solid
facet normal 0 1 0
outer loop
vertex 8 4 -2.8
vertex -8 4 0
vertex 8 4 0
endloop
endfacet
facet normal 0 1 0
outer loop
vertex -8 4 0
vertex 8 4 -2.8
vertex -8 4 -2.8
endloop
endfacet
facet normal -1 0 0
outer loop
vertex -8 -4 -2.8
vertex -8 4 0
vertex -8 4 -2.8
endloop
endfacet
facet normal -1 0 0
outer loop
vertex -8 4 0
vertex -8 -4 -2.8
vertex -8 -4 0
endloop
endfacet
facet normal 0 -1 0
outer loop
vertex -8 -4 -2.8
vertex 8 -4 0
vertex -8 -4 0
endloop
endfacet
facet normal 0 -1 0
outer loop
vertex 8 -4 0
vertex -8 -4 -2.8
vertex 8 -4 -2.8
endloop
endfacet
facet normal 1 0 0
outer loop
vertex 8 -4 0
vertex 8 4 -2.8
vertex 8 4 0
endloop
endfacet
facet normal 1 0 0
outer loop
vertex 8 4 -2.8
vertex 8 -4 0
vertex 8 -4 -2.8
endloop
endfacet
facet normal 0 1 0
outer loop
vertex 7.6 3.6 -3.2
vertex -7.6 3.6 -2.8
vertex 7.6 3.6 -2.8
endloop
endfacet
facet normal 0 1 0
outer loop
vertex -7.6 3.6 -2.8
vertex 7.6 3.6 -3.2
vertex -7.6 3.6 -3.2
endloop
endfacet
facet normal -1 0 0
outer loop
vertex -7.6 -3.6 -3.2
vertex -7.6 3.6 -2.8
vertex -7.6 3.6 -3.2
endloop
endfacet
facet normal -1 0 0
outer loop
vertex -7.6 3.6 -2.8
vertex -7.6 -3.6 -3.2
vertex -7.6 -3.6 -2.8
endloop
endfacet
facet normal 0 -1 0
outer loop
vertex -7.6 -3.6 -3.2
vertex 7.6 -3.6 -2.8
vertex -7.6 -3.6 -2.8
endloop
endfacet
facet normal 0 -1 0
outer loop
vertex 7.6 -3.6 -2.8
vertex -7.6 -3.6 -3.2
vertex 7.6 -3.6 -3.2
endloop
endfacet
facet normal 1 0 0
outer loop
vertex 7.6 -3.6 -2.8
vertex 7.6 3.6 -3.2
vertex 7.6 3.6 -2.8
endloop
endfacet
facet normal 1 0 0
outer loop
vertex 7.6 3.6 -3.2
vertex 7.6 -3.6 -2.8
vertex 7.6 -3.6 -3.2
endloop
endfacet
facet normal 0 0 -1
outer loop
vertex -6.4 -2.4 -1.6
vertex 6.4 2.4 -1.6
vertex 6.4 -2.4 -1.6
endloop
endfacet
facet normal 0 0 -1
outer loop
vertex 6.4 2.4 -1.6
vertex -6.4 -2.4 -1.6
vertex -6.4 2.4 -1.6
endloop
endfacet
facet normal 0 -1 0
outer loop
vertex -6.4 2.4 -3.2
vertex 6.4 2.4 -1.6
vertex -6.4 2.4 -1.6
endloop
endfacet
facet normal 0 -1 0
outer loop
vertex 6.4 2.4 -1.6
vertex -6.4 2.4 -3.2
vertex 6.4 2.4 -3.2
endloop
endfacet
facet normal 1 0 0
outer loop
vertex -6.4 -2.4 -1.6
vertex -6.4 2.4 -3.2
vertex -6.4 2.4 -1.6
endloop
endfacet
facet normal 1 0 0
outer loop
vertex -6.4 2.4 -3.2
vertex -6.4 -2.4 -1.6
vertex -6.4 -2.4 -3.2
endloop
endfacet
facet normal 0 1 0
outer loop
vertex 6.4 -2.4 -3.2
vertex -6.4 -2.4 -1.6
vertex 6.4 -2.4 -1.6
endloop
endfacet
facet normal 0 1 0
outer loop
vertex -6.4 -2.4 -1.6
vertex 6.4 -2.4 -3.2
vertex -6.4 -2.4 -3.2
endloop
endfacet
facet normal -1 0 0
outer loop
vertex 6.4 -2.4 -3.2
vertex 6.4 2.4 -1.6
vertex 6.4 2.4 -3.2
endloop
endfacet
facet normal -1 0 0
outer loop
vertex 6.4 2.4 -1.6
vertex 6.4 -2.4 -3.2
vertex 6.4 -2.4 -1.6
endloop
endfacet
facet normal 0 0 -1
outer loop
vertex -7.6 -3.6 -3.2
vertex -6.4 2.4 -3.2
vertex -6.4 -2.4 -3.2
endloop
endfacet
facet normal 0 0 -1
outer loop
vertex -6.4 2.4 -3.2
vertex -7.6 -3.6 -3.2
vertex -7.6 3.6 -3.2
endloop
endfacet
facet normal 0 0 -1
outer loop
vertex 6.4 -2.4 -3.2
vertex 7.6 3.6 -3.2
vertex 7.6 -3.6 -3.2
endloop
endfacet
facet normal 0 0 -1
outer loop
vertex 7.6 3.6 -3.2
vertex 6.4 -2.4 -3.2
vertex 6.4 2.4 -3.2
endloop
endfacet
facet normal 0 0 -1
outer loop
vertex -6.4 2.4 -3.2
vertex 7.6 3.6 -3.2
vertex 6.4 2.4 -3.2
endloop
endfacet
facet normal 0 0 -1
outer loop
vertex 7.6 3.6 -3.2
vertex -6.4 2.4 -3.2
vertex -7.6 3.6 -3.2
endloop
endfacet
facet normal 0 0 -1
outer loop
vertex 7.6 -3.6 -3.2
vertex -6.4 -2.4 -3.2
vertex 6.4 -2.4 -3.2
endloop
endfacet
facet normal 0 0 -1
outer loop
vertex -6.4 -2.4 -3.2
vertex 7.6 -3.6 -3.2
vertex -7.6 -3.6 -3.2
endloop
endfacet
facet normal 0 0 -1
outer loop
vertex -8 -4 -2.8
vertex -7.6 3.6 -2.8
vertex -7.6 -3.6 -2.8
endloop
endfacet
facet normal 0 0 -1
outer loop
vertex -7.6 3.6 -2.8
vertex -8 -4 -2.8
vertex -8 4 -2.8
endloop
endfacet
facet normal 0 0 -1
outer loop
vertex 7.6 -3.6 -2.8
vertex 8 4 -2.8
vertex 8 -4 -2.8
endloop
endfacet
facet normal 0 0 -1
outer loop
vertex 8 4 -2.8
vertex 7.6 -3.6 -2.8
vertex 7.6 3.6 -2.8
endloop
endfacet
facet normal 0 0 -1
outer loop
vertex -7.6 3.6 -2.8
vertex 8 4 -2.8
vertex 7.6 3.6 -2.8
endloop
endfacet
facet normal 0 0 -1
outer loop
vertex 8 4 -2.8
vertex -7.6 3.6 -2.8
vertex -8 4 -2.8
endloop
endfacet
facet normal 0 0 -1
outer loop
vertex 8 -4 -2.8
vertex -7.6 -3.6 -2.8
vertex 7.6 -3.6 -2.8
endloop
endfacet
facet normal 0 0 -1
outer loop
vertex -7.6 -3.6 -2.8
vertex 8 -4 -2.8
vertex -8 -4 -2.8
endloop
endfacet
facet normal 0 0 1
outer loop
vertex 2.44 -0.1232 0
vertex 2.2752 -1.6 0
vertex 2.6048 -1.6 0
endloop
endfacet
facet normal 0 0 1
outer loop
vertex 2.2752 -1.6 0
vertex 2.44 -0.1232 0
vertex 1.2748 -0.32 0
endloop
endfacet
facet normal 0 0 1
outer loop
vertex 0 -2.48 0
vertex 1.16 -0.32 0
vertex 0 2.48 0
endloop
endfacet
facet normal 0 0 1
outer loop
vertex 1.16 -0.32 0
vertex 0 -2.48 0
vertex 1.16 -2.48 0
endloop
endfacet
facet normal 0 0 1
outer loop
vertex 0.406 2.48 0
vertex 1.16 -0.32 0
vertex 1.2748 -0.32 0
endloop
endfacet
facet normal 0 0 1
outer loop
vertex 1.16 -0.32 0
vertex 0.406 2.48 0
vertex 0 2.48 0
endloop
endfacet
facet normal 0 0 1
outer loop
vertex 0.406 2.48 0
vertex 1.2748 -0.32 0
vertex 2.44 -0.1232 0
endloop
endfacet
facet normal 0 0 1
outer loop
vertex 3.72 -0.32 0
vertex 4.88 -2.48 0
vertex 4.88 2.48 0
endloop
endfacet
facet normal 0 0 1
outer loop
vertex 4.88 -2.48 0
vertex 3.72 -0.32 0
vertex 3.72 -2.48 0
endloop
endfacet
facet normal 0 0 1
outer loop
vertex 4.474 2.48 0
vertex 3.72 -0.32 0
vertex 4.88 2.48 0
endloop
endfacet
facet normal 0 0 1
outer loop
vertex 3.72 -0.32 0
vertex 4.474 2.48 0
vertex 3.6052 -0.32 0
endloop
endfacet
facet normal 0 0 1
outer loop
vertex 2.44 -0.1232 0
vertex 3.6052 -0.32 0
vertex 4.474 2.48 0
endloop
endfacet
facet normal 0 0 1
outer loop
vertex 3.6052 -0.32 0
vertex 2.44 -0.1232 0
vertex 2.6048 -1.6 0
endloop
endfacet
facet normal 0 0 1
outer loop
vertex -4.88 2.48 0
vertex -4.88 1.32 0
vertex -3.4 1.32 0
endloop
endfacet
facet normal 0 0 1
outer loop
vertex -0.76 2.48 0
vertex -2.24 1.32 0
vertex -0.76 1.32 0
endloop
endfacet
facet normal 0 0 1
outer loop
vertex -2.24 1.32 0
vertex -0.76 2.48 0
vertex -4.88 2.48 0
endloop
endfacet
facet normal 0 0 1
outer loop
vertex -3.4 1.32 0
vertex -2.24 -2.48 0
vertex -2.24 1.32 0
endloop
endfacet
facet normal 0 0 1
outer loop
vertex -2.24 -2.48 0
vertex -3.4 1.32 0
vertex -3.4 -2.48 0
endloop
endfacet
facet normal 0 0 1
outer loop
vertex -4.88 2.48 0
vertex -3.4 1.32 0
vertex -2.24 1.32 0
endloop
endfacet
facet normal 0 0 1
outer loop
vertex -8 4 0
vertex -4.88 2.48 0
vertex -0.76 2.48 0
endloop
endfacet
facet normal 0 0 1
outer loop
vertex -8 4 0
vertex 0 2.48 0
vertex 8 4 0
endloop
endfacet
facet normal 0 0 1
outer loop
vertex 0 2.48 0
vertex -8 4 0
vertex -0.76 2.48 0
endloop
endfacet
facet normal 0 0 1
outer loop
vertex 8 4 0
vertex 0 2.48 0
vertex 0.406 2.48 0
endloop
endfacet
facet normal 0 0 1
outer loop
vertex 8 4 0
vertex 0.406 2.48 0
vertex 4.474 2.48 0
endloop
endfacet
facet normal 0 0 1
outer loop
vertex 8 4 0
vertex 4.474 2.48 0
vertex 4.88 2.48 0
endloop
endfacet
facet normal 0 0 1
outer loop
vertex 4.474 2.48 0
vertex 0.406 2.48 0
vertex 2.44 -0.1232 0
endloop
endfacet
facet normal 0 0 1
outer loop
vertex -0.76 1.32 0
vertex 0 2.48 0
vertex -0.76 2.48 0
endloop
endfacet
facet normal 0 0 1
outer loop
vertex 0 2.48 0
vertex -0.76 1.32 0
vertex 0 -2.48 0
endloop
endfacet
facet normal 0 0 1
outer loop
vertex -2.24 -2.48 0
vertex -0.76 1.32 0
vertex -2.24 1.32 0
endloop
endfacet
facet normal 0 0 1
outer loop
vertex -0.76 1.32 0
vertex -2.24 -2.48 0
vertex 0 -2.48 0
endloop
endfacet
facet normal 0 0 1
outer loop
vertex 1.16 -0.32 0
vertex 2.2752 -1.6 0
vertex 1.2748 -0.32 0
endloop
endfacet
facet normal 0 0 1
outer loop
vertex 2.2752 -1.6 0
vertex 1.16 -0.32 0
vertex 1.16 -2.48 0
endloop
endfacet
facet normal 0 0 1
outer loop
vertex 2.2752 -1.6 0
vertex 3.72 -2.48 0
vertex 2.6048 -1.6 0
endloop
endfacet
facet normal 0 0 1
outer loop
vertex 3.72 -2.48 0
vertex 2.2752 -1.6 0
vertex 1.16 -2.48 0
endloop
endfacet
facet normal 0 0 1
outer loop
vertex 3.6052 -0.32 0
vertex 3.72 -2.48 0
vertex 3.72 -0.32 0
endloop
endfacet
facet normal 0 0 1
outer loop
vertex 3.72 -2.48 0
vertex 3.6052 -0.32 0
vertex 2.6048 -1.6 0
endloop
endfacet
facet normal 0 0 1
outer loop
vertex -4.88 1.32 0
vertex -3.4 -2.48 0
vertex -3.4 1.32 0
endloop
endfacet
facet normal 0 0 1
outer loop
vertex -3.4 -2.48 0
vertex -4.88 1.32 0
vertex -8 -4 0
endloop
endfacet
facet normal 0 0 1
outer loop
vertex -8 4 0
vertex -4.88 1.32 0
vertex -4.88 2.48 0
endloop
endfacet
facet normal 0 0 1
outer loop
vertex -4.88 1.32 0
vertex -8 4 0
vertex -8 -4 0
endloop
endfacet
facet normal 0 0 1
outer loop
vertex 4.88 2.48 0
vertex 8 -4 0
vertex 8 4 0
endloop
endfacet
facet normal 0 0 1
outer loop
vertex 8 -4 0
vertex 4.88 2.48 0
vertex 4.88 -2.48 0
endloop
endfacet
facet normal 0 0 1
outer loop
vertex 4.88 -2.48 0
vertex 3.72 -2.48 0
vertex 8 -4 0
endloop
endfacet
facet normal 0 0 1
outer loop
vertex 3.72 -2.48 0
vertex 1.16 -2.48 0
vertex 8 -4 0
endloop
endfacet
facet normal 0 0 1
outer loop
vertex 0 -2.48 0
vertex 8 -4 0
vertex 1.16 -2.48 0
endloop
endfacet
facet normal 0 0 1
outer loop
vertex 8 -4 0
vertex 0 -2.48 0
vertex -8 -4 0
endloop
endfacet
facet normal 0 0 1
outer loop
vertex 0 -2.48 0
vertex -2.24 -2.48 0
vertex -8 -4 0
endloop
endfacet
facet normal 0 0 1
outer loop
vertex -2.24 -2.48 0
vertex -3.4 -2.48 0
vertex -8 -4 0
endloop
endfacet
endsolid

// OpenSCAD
// file: ../p/box5.scad
use <../lib.scad>
function ldraw_lib__box5() = [
// 0 Box with 5 Faces and All Edges
// 0 Name: box5.dat
// 0 Author: James Jessiman
// 0 !LDRAW_ORG Primitive UPDATE 2012-01
// 0 !LICENSE Licensed under CC BY 4.0 : see CAreadme.txt
// 
// 0 BFC CERTIFY CCW
  [0,"BFC","CERTIFY"],
  [0,"BFC","CCW"],
// 
// 0 !HISTORY 2002-04-03 [sbliss] Modified for BFC compliance
// 0 !HISTORY 2002-04-25 [PTadmin] Official Update 2002-02
// 0 !HISTORY 2007-06-24 [PTadmin] Header formatted for Contributor Agreement
// 0 !HISTORY 2008-07-01 [PTadmin] Official Update 2008-01
// 0 !HISTORY 2012-02-16 [Philo] Changed to CCW
// 0 !HISTORY 2012-03-30 [PTadmin] Official Update 2012-01
// 
// 
// 2 24 1 1 1 -1 1 1
  [2,24,1,1,1,-1,1,1],
// 2 24 -1 1 1 -1 1 -1
  [2,24,-1,1,1,-1,1,-1],
// 2 24 -1 1 -1 1 1 -1
  [2,24,-1,1,-1,1,1,-1],
// 2 24 1 1 -1 1 1 1
  [2,24,1,1,-1,1,1,1],
// 2 24 1 0 1 -1 0 1
  [2,24,1,0,1,-1,0,1],
// 2 24 -1 0 1 -1 0 -1
  [2,24,-1,0,1,-1,0,-1],
// 2 24 -1 0 -1 1 0 -1
  [2,24,-1,0,-1,1,0,-1],
// 2 24 1 0 -1 1 0 1
  [2,24,1,0,-1,1,0,1],
// 2 24 1 0 1 1 1 1
  [2,24,1,0,1,1,1,1],
// 2 24 -1 0 1 -1 1 1
  [2,24,-1,0,1,-1,1,1],
// 2 24 1 0 -1 1 1 -1
  [2,24,1,0,-1,1,1,-1],
// 2 24 -1 0 -1 -1 1 -1
  [2,24,-1,0,-1,-1,1,-1],
// 4 16 -1 1 1 1 1 1 1 1 -1 -1 1 -1
  [4,16,-1,1,1,1,1,1,1,1,-1,-1,1,-1],
// 4 16 -1 1 1 -1 0 1 1 0 1 1 1 1
  [4,16,-1,1,1,-1,0,1,1,0,1,1,1,1],
// 4 16 -1 1 -1 -1 0 -1 -1 0 1 -1 1 1
  [4,16,-1,1,-1,-1,0,-1,-1,0,1,-1,1,1],
// 4 16 1 1 -1 1 0 -1 -1 0 -1 -1 1 -1
  [4,16,1,1,-1,1,0,-1,-1,0,-1,-1,1,-1],
// 4 16 1 1 1 1 0 1 1 0 -1 1 1 -1
  [4,16,1,1,1,1,0,1,1,0,-1,1,1,-1],
];
module ldraw_lib__box5(step=0, col=false, unit=2/5, alt=false, line=0.2, solid=!$preview)
    makepoly(ldraw_lib__box5(), step=step, col=col, unit=unit, alt=alt, line=line, solid=solid);
ldraw_lib__box5(line=0.2);
// file: ../p/box4.scad
use <../lib.scad>
function ldraw_lib__box4() = [
// 0 Box with 4 Faces (2 Parallel Pairs) and All Edges
// 0 Name: box4.dat
// 0 Author: James Jessiman
// 0 !LDRAW_ORG Primitive UPDATE 2012-01
// 0 !LICENSE Licensed under CC BY 4.0 : see CAreadme.txt
// 
// 0 BFC CERTIFY CCW
  [0,"BFC","CERTIFY"],
  [0,"BFC","CCW"],
// 
// 0 !HISTORY 2002-04-03 [sbliss] Modified for BFC compliance
// 0 !HISTORY 2002-04-25 [PTadmin] Official Update 2002-02
// 0 !HISTORY 2007-06-24 [PTadmin] Header formatted for Contributor Agreement
// 0 !HISTORY 2008-07-01 [PTadmin] Official Update 2008-01
// 0 !HISTORY 2012-02-16 [Philo] Changed to CCW
// 0 !HISTORY 2012-03-30 [PTadmin] Official Update 2012-01
// 
// 
// 2 24 1 1 1 -1 1 1
  [2,24,1,1,1,-1,1,1],
// 2 24 -1 1 1 -1 1 -1
  [2,24,-1,1,1,-1,1,-1],
// 2 24 -1 1 -1 1 1 -1
  [2,24,-1,1,-1,1,1,-1],
// 2 24 1 1 -1 1 1 1
  [2,24,1,1,-1,1,1,1],
// 2 24 1 0 1 -1 0 1
  [2,24,1,0,1,-1,0,1],
// 2 24 -1 0 1 -1 0 -1
  [2,24,-1,0,1,-1,0,-1],
// 2 24 -1 0 -1 1 0 -1
  [2,24,-1,0,-1,1,0,-1],
// 2 24 1 0 -1 1 0 1
  [2,24,1,0,-1,1,0,1],
// 2 24 1 0 1 1 1 1
  [2,24,1,0,1,1,1,1],
// 2 24 -1 0 1 -1 1 1
  [2,24,-1,0,1,-1,1,1],
// 2 24 1 0 -1 1 1 -1
  [2,24,1,0,-1,1,1,-1],
// 2 24 -1 0 -1 -1 1 -1
  [2,24,-1,0,-1,-1,1,-1],
// 4 16 -1 1 1 -1 0 1 1 0 1 1 1 1
  [4,16,-1,1,1,-1,0,1,1,0,1,1,1,1],
// 4 16 -1 1 -1 -1 0 -1 -1 0 1 -1 1 1
  [4,16,-1,1,-1,-1,0,-1,-1,0,1,-1,1,1],
// 4 16 1 1 -1 1 0 -1 -1 0 -1 -1 1 -1
  [4,16,1,1,-1,1,0,-1,-1,0,-1,-1,1,-1],
// 4 16 1 1 1 1 0 1 1 0 -1 1 1 -1
  [4,16,1,1,1,1,0,1,1,0,-1,1,1,-1],
];
module ldraw_lib__box4(step=0, col=false, unit=2/5, alt=false, line=0.2, solid=!$preview)
    makepoly(ldraw_lib__box4(), step=step, col=col, unit=unit, alt=alt, line=line, solid=solid);
ldraw_lib__box4(line=0.2);
// file: s/3069bs01.scad
use <../../lib.scad>
use <../../p/box4.scad>
use <../../p/box5.scad>
function ldraw_lib__s__3069bs01() = [
// 0 ~Tile  1 x  2 with Groove without Top Face
// 0 Name: s\3069bs01.dat
// 0 Author: Santeri Piippo [arezey]
// 0 !LDRAW_ORG Subpart UPDATE 2010-02
// 0 !LICENSE Licensed under CC BY 4.0 : see CAreadme.txt
// 
// 0 BFC CERTIFY CCW
  [0,"BFC","CERTIFY"],
  [0,"BFC","CCW"],
// 
// 0 !HISTORY 2010-07-05 [PTadmin] Official Update 2010-02
// 
// 
// 1 16 0 0 0 20 0 0 0 7 0 0 0 10 box4.dat
  [1,16,0,0,0,20,0,0,0,7,0,0,0,10, ldraw_lib__box4()],
// 1 16 0 7 0 19 0 0 0 1 0 0 0 9 box4.dat
  [1,16,0,7,0,19,0,0,0,1,0,0,0,9, ldraw_lib__box4()],
// 0 BFC INVERTNEXT
  [0,"BFC","INVERTNEXT"],
// 1 16 0 8 0 16 0 0 0 -4 0 0 0 6 box5.dat
  [1,16,0,8,0,16,0,0,0,-4,0,0,0,6, ldraw_lib__box5()],
// 4 16 -19 8 9 -16 8 6 -16 8 -6 -19 8 -9
  [4,16,-19,8,9,-16,8,6,-16,8,-6,-19,8,-9],
// 4 16 19 8 -9 16 8 -6 16 8 6 19 8 9
  [4,16,19,8,-9,16,8,-6,16,8,6,19,8,9],
// 4 16 19 8 9 16 8 6 -16 8 6 -19 8 9
  [4,16,19,8,9,16,8,6,-16,8,6,-19,8,9],
// 4 16 -19 8 -9 -16 8 -6 16 8 -6 19 8 -9
  [4,16,-19,8,-9,-16,8,-6,16,8,-6,19,8,-9],
// 4 16 -20 7 10 -19 7 9 -19 7 -9 -20 7 -10
  [4,16,-20,7,10,-19,7,9,-19,7,-9,-20,7,-10],
// 4 16 20 7 -10 19 7 -9 19 7 9 20 7 10
  [4,16,20,7,-10,19,7,-9,19,7,9,20,7,10],
// 4 16 20 7 10 19 7 9 -19 7 9 -20 7 10
  [4,16,20,7,10,19,7,9,-19,7,9,-20,7,10],
// 4 16 -20 7 -10 -19 7 -9 19 7 -9 20 7 -10
  [4,16,-20,7,-10,-19,7,-9,19,7,-9,20,7,-10],
// 0 //
];
module ldraw_lib__s__3069bs01(step=0, col=false, unit=2/5, alt=false, line=0.2, solid=!$preview)
    makepoly(ldraw_lib__s__3069bs01(), step=step, col=col, unit=unit, alt=alt, line=line, solid=solid);
ldraw_lib__s__3069bs01(line=0.2);
// main file
use <../lib.scad>
use <s/3069bs01.scad>
function ldraw_lib__3069bpta() = [
// 0 Tile  1 x  2 with Silver "TM" Pattern
// 0 Name: 3069bpta.dat
// 0 Author: Johann Eisner [technicbasics]
// 0 !LDRAW_ORG Part UPDATE 2025-02
// 0 !LICENSE Licensed under CC BY 4.0 : see CAreadme.txt
// 
// 0 BFC CERTIFY CCW
  [0,"BFC","CERTIFY"],
  [0,"BFC","CCW"],
// 
// 0 !KEYWORDS BrickOwl 1281147, LEGO ID 6533447, Rebrickable 3069bpr9955
// 0 !KEYWORDS Set 5008946, Set 6535735, Set 6535736, Set 6535737, Trade Mark
// 0 !KEYWORDS Trademark
// 
// 0 !HISTORY 2025-02-27 [OrionP] Official Update 2025-02
// 
// 1 16 0 0 0 1 0 0 0 1 0 0 0 1 s\3069bs01.dat
  [1,16,0,0,0,1,0,0,0,1,0,0,0,1, ldraw_lib__s__3069bs01()],
// 4 80 5.688 0 -4 6.512 0 -4 6.1 0 -.308 3.187 0 -.8
  [4,80,5.688,0,-4,6.512,0,-4,6.1,0,-.308,3.187,0,-.8],
// 4 80 0 0 -6.2 2.9 0 -6.2 2.9 0 -0.8 0 0 6.2
  [4,80,0,0,-6.2,2.9,0,-6.2,2.9,0,-0.8,0,0,6.2],
// 4 80 2.9 0 -0.8 3.187 0 -0.8 1.015 0 6.2 0 0 6.2
  [4,80,2.9,0,-0.8,3.187,0,-0.8,1.015,0,6.2,0,0,6.2],
// 3 80 1.015 0 6.2 3.187 0 -0.8 6.1 0 -0.308
  [3,80,1.015,0,6.2,3.187,0,-0.8,6.1,0,-0.308],
// 4 80 9.3 0 -0.8 9.3 0 -6.2 12.2 0 -6.2 12.2 0 6.2
  [4,80,9.3,0,-0.8,9.3,0,-6.2,12.2,0,-6.2,12.2,0,6.2],
// 4 80 9.3 0 -0.8 12.2 0 6.2 11.185 0 6.2 9.013 0 -0.8
  [4,80,9.3,0,-0.8,12.2,0,6.2,11.185,0,6.2,9.013,0,-0.8],
// 4 80 9.013 0 -.8 11.185 0 6.2 6.1 0 -.308 6.512 0 -4
  [4,80,9.013,0,-.8,11.185,0,6.2,6.1,0,-.308,6.512,0,-4],
// 3 80 -12.2 0 6.2 -12.2 0 3.3 -8.5 0 3.3
  [3,80,-12.2,0,6.2,-12.2,0,3.3,-8.5,0,3.3],
// 4 80 -5.6 0 3.3 -1.9 0 3.3 -1.9 0 6.2 -12.2 0 6.2
  [4,80,-5.6,0,3.3,-1.9,0,3.3,-1.9,0,6.2,-12.2,0,6.2],
// 4 80 -5.6 0 3.3 -8.5 0 3.3 -8.5 0 -6.2 -5.6 0 -6.2
  [4,80,-5.6,0,3.3,-8.5,0,3.3,-8.5,0,-6.2,-5.6,0,-6.2],
// 3 80 -12.2 0 6.2 -8.5 0 3.3 -5.6 0 3.3
  [3,80,-12.2,0,6.2,-8.5,0,3.3,-5.6,0,3.3],
// 3 16 -20 0 10 -12.2 0 6.2 -1.9 0 6.2
  [3,16,-20,0,10,-12.2,0,6.2,-1.9,0,6.2],
// 4 16 -20 0 10 -1.9 0 6.2 0 0 6.2 20 0 10
  [4,16,-20,0,10,-1.9,0,6.2,0,0,6.2,20,0,10],
// 3 16 20 0 10 0 0 6.2 1.015 0 6.2
  [3,16,20,0,10,0,0,6.2,1.015,0,6.2],
// 3 16 20 0 10 1.015 0 6.2 11.185 0 6.2
  [3,16,20,0,10,1.015,0,6.2,11.185,0,6.2],
// 3 16 20 0 10 11.185 0 6.2 12.2 0 6.2
  [3,16,20,0,10,11.185,0,6.2,12.2,0,6.2],
// 3 16 11.185 0 6.2 1.015 0 6.2 6.1 0 -0.308
  [3,16,11.185,0,6.2,1.015,0,6.2,6.1,0,-0.308],
// 4 16 0 0 6.2 -1.9 0 6.2 -1.9 0 3.3 0 0 -6.2
  [4,16,0,0,6.2,-1.9,0,6.2,-1.9,0,3.3,0,0,-6.2],
// 4 16 -5.6 0 -6.2 0 0 -6.2 -1.9 0 3.3 -5.6 0 3.3
  [4,16,-5.6,0,-6.2,0,0,-6.2,-1.9,0,3.3,-5.6,0,3.3],
// 4 16 3.187 0 -0.8 2.9 0 -0.8 2.9 0 -6.2 5.688 0 -4
  [4,16,3.187,0,-0.8,2.9,0,-0.8,2.9,0,-6.2,5.688,0,-4],
// 4 16 6.512 0 -4 5.688 0 -4 2.9 0 -6.2 9.3 0 -6.2
  [4,16,6.512,0,-4,5.688,0,-4,2.9,0,-6.2,9.3,0,-6.2],
// 4 16 9.013 0 -.8 6.512 0 -4 9.3 0 -6.2 9.3 0 -.8
  [4,16,9.013,0,-.8,6.512,0,-4,9.3,0,-6.2,9.3,0,-.8],
// 4 16 -8.5 0 -6.2 -8.5 0 3.3 -12.2 0 3.3 -20 0 -10
  [4,16,-8.5,0,-6.2,-8.5,0,3.3,-12.2,0,3.3,-20,0,-10],
// 4 16 -20 0 10 -20 0 -10 -12.2 0 3.3 -12.2 0 6.2
  [4,16,-20,0,10,-20,0,-10,-12.2,0,3.3,-12.2,0,6.2],
// 4 16 20 0 10 12.2 0 6.2 12.2 0 -6.2 20 0 -10
  [4,16,20,0,10,12.2,0,6.2,12.2,0,-6.2,20,0,-10],
// 3 16 12.2 0 -6.2 9.3 0 -6.2 20 0 -10
  [3,16,12.2,0,-6.2,9.3,0,-6.2,20,0,-10],
// 3 16 9.3 0 -6.2 2.9 0 -6.2 20 0 -10
  [3,16,9.3,0,-6.2,2.9,0,-6.2,20,0,-10],
// 4 16 20 0 -10 2.9 0 -6.2 0 0 -6.2 -20 0 -10
  [4,16,20,0,-10,2.9,0,-6.2,0,0,-6.2,-20,0,-10],
// 3 16 0 0 -6.2 -5.6 0 -6.2 -20 0 -10
  [3,16,0,0,-6.2,-5.6,0,-6.2,-20,0,-10],
// 3 16 -5.6 0 -6.2 -8.5 0 -6.2 -20 0 -10
  [3,16,-5.6,0,-6.2,-8.5,0,-6.2,-20,0,-10],
];
module ldraw_lib__3069bpta(step=0, col=false, unit=2/5, alt=false, line=0.2, solid=!$preview)
    makepoly(ldraw_lib__3069bpta(), step=step, col=col, unit=unit, alt=alt, line=line, solid=solid);
ldraw_lib__3069bpta(line=0.2);
